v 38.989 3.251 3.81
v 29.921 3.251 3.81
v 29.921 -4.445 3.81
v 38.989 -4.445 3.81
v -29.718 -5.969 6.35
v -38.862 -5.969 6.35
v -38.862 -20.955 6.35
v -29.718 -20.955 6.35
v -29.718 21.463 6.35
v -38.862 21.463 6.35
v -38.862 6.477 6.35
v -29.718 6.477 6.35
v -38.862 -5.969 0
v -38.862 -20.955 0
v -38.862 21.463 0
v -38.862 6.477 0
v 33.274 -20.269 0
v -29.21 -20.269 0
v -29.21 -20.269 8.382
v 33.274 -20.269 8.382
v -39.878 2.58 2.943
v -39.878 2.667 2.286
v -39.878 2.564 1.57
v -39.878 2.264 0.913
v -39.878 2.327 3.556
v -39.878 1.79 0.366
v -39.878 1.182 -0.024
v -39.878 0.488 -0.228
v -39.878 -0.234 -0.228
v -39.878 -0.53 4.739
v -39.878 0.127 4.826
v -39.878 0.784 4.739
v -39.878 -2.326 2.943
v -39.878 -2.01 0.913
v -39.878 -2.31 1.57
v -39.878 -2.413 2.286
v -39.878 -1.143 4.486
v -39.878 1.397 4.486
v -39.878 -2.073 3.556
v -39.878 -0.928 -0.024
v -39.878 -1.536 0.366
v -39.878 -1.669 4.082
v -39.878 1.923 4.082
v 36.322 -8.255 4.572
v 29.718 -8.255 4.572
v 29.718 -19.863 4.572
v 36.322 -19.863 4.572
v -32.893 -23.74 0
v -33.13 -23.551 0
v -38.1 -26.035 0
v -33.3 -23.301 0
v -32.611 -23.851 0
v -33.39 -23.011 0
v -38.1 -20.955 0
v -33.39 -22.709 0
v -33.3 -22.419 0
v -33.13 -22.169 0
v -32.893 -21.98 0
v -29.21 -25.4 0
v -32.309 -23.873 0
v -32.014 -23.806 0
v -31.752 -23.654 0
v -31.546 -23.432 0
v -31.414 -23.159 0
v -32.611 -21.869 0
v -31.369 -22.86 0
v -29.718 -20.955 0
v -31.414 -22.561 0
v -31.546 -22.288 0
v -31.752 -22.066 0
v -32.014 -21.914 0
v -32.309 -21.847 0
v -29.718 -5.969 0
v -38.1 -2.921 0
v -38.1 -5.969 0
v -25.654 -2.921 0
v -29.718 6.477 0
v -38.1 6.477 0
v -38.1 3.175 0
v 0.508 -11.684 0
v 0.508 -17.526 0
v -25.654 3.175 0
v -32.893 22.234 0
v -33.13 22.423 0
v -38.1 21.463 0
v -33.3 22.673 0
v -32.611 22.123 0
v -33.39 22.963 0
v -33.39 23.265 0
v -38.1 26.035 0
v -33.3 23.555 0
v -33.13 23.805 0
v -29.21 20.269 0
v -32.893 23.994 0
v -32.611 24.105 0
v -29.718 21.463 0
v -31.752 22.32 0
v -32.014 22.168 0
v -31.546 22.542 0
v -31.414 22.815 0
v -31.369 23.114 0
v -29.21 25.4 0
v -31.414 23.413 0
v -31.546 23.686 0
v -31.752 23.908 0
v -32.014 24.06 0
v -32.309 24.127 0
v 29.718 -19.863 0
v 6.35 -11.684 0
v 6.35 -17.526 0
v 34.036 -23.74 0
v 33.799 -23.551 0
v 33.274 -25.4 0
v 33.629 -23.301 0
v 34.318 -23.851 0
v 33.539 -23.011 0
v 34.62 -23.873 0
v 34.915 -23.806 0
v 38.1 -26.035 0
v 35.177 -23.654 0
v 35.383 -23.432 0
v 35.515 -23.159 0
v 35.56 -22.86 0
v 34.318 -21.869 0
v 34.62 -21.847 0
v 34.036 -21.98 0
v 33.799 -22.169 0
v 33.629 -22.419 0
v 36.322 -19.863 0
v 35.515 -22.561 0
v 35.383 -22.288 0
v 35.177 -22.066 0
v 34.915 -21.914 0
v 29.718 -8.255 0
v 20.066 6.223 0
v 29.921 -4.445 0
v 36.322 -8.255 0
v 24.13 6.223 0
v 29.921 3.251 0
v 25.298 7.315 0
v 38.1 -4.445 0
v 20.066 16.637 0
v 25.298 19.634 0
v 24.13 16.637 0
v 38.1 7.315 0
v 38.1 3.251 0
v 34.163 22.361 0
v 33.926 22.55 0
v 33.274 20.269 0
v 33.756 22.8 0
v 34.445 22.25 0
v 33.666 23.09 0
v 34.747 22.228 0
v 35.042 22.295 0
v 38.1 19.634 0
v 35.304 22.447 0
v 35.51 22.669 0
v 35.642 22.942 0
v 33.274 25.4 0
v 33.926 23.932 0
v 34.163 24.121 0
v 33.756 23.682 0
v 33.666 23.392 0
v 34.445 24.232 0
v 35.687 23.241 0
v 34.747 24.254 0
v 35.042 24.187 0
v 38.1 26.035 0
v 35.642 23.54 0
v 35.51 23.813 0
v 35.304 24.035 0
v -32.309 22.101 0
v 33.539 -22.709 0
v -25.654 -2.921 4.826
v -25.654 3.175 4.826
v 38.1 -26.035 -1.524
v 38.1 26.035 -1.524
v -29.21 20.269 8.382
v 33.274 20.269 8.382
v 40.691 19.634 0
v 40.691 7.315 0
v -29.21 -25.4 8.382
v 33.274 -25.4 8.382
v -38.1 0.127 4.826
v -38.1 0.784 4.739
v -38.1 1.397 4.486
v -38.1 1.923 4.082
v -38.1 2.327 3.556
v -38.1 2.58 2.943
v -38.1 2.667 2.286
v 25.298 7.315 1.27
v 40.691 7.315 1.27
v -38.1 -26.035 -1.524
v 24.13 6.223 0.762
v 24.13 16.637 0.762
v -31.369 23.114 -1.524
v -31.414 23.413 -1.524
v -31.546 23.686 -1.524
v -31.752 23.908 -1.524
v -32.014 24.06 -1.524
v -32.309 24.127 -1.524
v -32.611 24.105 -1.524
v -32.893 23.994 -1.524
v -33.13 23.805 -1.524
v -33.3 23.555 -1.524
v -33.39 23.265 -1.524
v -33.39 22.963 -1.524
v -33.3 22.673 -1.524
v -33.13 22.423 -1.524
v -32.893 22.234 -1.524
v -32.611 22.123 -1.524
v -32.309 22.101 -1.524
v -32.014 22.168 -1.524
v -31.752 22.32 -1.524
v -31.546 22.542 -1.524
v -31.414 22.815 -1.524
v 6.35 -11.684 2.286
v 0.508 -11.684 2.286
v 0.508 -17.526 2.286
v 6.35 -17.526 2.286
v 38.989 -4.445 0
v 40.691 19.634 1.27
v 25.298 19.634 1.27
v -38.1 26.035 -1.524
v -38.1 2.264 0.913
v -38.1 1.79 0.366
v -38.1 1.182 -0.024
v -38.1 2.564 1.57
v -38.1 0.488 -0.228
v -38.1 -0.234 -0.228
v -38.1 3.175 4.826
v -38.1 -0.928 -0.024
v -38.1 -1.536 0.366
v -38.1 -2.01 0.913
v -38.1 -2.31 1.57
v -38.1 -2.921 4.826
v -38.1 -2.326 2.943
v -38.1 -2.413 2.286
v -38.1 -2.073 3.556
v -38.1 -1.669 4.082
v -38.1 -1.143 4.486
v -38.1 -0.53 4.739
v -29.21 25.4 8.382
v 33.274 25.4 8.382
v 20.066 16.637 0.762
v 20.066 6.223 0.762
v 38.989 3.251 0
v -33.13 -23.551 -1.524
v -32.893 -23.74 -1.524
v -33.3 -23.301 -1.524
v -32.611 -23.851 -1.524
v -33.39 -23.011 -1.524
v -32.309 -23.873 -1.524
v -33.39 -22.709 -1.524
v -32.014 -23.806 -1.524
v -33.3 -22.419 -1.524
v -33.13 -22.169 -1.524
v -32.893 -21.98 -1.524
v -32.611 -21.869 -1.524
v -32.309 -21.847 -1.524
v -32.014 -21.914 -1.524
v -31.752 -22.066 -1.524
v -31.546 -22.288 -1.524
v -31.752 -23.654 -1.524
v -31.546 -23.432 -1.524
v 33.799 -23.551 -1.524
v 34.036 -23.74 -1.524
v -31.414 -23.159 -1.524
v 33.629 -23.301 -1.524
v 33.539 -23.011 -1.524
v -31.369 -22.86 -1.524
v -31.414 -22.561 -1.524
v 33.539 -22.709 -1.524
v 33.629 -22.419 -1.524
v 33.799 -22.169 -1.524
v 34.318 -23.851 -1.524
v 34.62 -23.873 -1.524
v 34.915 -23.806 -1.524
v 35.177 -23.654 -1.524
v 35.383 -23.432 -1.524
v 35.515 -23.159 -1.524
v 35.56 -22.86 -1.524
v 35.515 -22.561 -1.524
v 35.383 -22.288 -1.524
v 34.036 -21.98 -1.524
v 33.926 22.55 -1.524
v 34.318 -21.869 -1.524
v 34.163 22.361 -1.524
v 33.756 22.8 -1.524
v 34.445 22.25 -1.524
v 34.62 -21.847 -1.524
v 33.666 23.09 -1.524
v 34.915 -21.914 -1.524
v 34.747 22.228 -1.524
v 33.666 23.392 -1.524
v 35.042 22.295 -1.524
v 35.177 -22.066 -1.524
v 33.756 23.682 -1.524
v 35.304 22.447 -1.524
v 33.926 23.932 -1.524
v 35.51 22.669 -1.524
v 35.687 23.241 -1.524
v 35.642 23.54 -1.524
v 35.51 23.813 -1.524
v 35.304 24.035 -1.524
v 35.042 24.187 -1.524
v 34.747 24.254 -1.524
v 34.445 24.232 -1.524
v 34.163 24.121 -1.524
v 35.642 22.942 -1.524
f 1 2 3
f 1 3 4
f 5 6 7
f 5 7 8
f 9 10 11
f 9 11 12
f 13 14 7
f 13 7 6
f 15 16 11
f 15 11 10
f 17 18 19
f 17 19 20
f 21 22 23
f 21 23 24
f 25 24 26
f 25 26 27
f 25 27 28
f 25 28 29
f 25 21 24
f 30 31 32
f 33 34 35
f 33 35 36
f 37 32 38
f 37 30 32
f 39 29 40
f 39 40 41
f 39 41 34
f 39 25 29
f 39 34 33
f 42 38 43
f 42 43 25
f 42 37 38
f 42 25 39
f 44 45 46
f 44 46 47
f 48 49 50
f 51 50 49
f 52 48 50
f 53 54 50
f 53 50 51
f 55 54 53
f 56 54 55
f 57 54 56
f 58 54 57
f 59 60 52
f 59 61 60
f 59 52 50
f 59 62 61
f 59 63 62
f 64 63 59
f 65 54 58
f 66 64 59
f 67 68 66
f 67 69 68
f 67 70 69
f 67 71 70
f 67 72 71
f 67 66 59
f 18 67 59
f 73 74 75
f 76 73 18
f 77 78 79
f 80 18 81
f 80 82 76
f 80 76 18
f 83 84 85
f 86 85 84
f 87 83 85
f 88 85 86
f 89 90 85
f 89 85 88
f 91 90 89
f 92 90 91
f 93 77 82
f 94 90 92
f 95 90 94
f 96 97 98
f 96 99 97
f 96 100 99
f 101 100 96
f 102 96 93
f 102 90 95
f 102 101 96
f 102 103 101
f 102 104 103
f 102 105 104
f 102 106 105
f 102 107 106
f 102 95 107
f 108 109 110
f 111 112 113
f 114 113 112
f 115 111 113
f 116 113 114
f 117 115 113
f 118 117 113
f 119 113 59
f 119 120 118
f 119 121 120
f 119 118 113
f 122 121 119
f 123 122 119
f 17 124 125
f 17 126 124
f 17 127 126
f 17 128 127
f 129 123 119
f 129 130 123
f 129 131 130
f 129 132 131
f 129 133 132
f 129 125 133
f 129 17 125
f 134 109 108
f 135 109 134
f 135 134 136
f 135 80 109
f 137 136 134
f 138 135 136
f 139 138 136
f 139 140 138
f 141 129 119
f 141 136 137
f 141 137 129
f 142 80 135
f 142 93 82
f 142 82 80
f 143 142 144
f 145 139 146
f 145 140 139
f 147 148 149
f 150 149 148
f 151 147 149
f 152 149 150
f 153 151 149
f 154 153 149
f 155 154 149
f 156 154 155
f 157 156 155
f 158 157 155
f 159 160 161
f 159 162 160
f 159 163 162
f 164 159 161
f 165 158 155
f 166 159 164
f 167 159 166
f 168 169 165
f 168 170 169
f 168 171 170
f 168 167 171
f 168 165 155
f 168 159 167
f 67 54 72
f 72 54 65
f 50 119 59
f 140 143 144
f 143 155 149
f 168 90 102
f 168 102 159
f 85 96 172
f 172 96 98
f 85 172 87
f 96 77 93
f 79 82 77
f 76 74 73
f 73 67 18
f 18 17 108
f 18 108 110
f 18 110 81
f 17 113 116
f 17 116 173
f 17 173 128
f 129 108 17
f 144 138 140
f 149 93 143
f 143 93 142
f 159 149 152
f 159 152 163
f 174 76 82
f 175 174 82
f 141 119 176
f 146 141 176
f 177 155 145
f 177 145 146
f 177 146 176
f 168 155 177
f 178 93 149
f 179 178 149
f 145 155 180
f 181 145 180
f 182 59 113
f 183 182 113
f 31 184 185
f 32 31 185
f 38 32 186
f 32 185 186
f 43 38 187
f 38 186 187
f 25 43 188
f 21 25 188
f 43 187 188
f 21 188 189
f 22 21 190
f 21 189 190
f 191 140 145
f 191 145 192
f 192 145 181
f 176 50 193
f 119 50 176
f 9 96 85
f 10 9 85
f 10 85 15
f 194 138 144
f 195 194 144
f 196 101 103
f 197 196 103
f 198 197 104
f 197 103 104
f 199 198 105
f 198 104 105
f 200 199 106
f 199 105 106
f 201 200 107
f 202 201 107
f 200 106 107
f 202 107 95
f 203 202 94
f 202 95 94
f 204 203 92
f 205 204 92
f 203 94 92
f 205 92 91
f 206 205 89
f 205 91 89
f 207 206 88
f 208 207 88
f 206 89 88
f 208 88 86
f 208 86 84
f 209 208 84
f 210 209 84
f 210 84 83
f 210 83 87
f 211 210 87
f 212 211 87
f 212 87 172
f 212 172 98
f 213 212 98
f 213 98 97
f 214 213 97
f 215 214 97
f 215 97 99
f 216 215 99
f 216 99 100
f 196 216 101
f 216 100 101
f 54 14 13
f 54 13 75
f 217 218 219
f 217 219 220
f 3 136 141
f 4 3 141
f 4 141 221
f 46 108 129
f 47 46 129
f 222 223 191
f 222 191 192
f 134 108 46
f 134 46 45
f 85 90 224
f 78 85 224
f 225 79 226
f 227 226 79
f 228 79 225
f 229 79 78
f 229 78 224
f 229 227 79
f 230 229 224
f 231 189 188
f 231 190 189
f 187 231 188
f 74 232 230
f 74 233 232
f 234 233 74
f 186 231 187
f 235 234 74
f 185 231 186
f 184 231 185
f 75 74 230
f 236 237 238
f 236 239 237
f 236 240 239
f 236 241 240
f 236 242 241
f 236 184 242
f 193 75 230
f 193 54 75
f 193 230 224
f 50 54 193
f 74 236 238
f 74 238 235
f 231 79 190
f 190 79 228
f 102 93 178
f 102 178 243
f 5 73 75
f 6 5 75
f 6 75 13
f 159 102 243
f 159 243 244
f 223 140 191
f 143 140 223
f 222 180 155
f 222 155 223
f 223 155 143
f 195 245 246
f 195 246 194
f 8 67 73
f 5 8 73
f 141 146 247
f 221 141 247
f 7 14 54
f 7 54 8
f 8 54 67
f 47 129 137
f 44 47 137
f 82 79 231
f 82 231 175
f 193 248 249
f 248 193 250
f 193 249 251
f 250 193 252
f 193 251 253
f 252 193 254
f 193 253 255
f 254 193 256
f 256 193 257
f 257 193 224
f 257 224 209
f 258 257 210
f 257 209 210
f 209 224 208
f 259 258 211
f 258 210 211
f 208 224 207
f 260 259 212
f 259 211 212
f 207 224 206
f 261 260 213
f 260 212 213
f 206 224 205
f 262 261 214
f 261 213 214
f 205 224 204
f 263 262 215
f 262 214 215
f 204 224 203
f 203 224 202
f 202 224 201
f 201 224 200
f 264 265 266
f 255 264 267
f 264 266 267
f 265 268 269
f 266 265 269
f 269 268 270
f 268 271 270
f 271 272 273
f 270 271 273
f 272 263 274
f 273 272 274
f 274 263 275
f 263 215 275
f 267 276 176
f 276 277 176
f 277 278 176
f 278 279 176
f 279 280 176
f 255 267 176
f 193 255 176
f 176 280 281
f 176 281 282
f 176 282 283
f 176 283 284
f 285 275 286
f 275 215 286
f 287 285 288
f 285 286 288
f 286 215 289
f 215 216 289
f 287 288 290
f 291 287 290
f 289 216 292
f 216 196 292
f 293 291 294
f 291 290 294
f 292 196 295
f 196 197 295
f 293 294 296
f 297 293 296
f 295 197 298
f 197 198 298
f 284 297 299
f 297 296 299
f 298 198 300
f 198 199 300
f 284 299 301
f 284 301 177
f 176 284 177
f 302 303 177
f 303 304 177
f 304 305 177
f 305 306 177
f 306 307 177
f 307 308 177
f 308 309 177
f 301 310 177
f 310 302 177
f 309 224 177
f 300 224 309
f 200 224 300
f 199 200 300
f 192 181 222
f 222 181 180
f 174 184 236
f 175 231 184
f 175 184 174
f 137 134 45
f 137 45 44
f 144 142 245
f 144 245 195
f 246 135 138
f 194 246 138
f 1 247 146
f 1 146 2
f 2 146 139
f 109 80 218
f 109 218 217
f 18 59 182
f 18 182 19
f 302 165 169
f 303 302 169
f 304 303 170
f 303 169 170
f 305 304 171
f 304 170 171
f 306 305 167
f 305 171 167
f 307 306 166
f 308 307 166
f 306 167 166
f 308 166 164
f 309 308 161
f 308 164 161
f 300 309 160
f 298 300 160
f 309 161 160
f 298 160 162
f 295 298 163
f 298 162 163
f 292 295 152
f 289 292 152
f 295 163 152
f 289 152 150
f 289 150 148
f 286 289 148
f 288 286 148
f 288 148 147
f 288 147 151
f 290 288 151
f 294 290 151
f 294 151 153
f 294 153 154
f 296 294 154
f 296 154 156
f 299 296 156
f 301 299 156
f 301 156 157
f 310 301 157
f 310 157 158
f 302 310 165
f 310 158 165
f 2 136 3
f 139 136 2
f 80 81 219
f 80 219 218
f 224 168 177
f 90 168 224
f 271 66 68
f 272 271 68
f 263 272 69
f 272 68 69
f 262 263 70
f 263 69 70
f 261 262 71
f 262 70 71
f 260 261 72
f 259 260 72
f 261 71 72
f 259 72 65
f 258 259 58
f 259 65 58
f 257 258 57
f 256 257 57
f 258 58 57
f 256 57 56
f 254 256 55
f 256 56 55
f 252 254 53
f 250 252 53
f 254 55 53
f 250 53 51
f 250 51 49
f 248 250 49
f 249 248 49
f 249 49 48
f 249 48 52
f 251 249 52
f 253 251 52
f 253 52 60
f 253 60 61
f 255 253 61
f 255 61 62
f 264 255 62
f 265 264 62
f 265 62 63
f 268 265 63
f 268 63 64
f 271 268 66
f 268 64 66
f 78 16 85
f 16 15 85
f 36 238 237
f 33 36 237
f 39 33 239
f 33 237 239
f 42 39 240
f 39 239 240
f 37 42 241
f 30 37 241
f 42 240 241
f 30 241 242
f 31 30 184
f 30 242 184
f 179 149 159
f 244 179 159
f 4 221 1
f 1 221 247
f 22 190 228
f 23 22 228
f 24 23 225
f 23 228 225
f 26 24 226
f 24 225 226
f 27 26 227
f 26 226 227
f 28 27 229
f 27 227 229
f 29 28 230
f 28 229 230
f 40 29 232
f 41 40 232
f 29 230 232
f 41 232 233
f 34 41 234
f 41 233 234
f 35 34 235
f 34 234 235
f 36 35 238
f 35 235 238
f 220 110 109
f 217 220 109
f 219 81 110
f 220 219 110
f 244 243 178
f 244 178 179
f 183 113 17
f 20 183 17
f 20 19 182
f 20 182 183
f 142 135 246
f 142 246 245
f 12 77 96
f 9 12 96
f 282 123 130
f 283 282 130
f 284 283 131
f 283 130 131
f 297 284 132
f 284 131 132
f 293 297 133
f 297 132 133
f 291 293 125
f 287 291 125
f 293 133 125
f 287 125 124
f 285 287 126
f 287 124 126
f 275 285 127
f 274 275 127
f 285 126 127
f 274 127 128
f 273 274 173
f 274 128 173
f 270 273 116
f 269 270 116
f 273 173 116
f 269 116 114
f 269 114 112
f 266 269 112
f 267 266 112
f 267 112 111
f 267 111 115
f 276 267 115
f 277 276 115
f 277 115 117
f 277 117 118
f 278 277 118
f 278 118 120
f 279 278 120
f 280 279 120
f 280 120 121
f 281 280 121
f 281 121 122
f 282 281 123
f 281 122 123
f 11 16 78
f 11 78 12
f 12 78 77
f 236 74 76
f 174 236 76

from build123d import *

# Parameters (mm, degrees)
F0_R      = 1.016
F0_W      = 62.484
F0_H      = 5.1308
F0_W_2    = 5.842
F0_H_2    = 5.842
F0_W_3    = 6.604
F0_H_3    = 11.6078
F0_W_4    = 4.064
F0_H_4    = 10.414
F0_W_5    = 12.8016
F0_H_5    = 12.319
F0_W_6    = 8.1788
F0_H_6    = 7.6962
F0_W_7    = 8.382
F0_H_7    = 14.986
F0_W_8    = 12.446
F0_H_8    = 6.096
F1_DEPTH  = 1.524
F2_DEPTH  = 8.382
F0_W_9    = 0.762
F3_DEPTH  = 6.35
F4_DEPTH  = 4.826
F5_DEPTH  = 2.286
F0_W_10   = 2.5908
F6_DEPTH  = 1.27
F0_W_11   = 0.889
F7_DEPTH  = 3.81
F8_DEPTH  = 4.572
F9_DEPTH  = 0.762
F11_DEPTH = 1.778


with BuildPart() as f1:
    # F0 (on Top) → F1 (new body)
    with BuildSketch(Plane.XY):
        Polygon((38.1, 26.035), (-38.1, 26.035), (-38.1, 21.463), (-29.718, 21.463), (-29.718, 6.477), (-38.1, 6.477), (-38.1, 3.175), (-25.654, 3.175), (-25.654, -2.921), (-38.1, -2.921), (-38.1, -5.969), (-29.718, -5.969), (-29.718, -20.955), (-38.1, -20.955), (-38.1, -26.035), (38.1, -26.035), (38.1, -4.445), (29.9212, -4.445), (29.9212, 3.2512), (38.1, 3.2512), (38.1, 7.3152), (25.2984, 7.3152), (25.2984, 19.6342), (38.1, 19.6342), align=None)
        with Locations((-32.385, -22.86)):
            Circle(F0_R, mode=Mode.SUBTRACT)
        with Locations((2.032, -22.8346)):
            Rectangle(F0_W, F0_H, mode=Mode.SUBTRACT)
        with Locations((3.429, -14.605)):
            Rectangle(F0_W_2, F0_H_2, mode=Mode.SUBTRACT)
        with Locations((34.544, -22.86)):
            Circle(F0_R, mode=Mode.SUBTRACT)
        with Locations((33.02, -14.0589)):
            Rectangle(F0_W_3, F0_H_3, mode=Mode.SUBTRACT)
        with Locations((-32.385, 23.114)):
            Circle(F0_R, mode=Mode.SUBTRACT)
        with Locations((22.098, 11.43)):
            Rectangle(F0_W_4, F0_H_4, mode=Mode.SUBTRACT)
        with Locations((2.032, 22.8346)):
            Rectangle(F0_W, F0_H, mode=Mode.SUBTRACT)
        with Locations((34.671, 23.241)):
            Circle(F0_R, mode=Mode.SUBTRACT)
        with Locations((2.032, 22.8346)):
            Rectangle(F0_W, F0_H)
        with Locations((31.6992, 13.4747)):
            Rectangle(F0_W_5, F0_H_5)
        with Locations((34.0106, -0.5969)):
            Rectangle(F0_W_6, F0_H_6)
        with Locations((33.02, -14.0589)):
            Rectangle(F0_W_3, F0_H_3)
        with Locations((2.032, -22.8346)):
            Rectangle(F0_W, F0_H)
        with Locations((3.429, -14.605)):
            Rectangle(F0_W_2, F0_H_2)
        with Locations((-33.909, -13.462)):
            Rectangle(F0_W_7, F0_H_7)
        with Locations((-31.877, 0.127)):
            Rectangle(F0_W_8, F0_H_8)
        with Locations((-33.909, 13.97)):
            Rectangle(F0_W_7, F0_H_7)
        with Locations((22.098, 11.43)):
            Rectangle(F0_W_4, F0_H_4)
    extrude(amount=-F1_DEPTH)

    # F0 (on Top) → F2 (join)
    with BuildSketch(Plane.XY):
        with Locations((2.032, 22.8346)):
            Rectangle(F0_W, F0_H)
        with Locations((2.032, -22.8346)):
            Rectangle(F0_W, F0_H)
    extrude(amount=F2_DEPTH)

    # F0 (on Top) → F3 (join)
    with BuildSketch(Plane.XY):
        with Locations((-33.909, 13.97)):
            Rectangle(F0_W_7, F0_H_7)
        with Locations((-38.481, 13.97)):
            Rectangle(F0_W_9, F0_H_7)
        with Locations((-38.481, -13.462)):
            Rectangle(F0_W_9, F0_H_7)
        with Locations((-33.909, -13.462)):
            Rectangle(F0_W_7, F0_H_7)
    extrude(amount=F3_DEPTH)

    # F0 (on Top) → F4 (join)
    with BuildSketch(Plane.XY):
        with Locations((-31.877, 0.127)):
            Rectangle(F0_W_8, F0_H_8)
    extrude(amount=F4_DEPTH)

    # F0 (on Top) → F5 (join)
    with BuildSketch(Plane.XY):
        with Locations((3.429, -14.605)):
            Rectangle(F0_W_2, F0_H_2)
    extrude(amount=F5_DEPTH)

    # F0 (on Top) → F6 (join)
    with BuildSketch(Plane.XY):
        with Locations((31.6992, 13.4747)):
            Rectangle(F0_W_5, F0_H_5)
        with Locations((39.3954, 13.4747)):
            Rectangle(F0_W_10, F0_H_5)
    extrude(amount=F6_DEPTH)

    # F0 (on Top) → F7 (join)
    with BuildSketch(Plane.XY):
        with Locations((34.0106, -0.5969)):
            Rectangle(F0_W_6, F0_H_6)
        with Locations((38.5445, -0.5969)):
            Rectangle(F0_W_11, F0_H_6)
    extrude(amount=F7_DEPTH)

    # F0 (on Top) → F8 (join)
    with BuildSketch(Plane.XY):
        with Locations((33.02, -14.0589)):
            Rectangle(F0_W_3, F0_H_3)
    extrude(amount=F8_DEPTH)

    # F0 (on Top) → F9 (join)
    with BuildSketch(Plane.XY):
        with Locations((22.098, 11.43)):
            Rectangle(F0_W_4, F0_H_4)
    extrude(amount=F9_DEPTH)

    # F10 (on face) → F11 (join)
    with BuildSketch(Plane(origin=(-38.1, 0, 0), x_dir=(0, -1, 0), z_dir=(-1, 0, 0))):
        with BuildLine():
            Line((-0.127, 2.286), (2.413, 2.286))
            ThreePointArc((2.413, 2.286), (1.669051, 4.082051), (-0.127, 4.826))
            Line((-0.127, 4.826), (-0.127, 2.286))
        make_face()
        with BuildLine():
            Line((-0.127, 2.286), (-0.127, 4.826))
            ThreePointArc((-0.127, 4.826), (-1.923051, 4.082051), (-2.667, 2.286))
            Line((-2.667, 2.286), (-0.127, 2.286))
        make_face()
        with BuildLine():
            ThreePointArc((-2.667, 2.286), (-0.127, -0.254), (2.413, 2.286))
            Line((2.413, 2.286), (-0.127, 2.286))
            Line((-0.127, 2.286), (-2.667, 2.286))
        make_face()
    extrude(amount=F11_DEPTH)


solid = f1.part
